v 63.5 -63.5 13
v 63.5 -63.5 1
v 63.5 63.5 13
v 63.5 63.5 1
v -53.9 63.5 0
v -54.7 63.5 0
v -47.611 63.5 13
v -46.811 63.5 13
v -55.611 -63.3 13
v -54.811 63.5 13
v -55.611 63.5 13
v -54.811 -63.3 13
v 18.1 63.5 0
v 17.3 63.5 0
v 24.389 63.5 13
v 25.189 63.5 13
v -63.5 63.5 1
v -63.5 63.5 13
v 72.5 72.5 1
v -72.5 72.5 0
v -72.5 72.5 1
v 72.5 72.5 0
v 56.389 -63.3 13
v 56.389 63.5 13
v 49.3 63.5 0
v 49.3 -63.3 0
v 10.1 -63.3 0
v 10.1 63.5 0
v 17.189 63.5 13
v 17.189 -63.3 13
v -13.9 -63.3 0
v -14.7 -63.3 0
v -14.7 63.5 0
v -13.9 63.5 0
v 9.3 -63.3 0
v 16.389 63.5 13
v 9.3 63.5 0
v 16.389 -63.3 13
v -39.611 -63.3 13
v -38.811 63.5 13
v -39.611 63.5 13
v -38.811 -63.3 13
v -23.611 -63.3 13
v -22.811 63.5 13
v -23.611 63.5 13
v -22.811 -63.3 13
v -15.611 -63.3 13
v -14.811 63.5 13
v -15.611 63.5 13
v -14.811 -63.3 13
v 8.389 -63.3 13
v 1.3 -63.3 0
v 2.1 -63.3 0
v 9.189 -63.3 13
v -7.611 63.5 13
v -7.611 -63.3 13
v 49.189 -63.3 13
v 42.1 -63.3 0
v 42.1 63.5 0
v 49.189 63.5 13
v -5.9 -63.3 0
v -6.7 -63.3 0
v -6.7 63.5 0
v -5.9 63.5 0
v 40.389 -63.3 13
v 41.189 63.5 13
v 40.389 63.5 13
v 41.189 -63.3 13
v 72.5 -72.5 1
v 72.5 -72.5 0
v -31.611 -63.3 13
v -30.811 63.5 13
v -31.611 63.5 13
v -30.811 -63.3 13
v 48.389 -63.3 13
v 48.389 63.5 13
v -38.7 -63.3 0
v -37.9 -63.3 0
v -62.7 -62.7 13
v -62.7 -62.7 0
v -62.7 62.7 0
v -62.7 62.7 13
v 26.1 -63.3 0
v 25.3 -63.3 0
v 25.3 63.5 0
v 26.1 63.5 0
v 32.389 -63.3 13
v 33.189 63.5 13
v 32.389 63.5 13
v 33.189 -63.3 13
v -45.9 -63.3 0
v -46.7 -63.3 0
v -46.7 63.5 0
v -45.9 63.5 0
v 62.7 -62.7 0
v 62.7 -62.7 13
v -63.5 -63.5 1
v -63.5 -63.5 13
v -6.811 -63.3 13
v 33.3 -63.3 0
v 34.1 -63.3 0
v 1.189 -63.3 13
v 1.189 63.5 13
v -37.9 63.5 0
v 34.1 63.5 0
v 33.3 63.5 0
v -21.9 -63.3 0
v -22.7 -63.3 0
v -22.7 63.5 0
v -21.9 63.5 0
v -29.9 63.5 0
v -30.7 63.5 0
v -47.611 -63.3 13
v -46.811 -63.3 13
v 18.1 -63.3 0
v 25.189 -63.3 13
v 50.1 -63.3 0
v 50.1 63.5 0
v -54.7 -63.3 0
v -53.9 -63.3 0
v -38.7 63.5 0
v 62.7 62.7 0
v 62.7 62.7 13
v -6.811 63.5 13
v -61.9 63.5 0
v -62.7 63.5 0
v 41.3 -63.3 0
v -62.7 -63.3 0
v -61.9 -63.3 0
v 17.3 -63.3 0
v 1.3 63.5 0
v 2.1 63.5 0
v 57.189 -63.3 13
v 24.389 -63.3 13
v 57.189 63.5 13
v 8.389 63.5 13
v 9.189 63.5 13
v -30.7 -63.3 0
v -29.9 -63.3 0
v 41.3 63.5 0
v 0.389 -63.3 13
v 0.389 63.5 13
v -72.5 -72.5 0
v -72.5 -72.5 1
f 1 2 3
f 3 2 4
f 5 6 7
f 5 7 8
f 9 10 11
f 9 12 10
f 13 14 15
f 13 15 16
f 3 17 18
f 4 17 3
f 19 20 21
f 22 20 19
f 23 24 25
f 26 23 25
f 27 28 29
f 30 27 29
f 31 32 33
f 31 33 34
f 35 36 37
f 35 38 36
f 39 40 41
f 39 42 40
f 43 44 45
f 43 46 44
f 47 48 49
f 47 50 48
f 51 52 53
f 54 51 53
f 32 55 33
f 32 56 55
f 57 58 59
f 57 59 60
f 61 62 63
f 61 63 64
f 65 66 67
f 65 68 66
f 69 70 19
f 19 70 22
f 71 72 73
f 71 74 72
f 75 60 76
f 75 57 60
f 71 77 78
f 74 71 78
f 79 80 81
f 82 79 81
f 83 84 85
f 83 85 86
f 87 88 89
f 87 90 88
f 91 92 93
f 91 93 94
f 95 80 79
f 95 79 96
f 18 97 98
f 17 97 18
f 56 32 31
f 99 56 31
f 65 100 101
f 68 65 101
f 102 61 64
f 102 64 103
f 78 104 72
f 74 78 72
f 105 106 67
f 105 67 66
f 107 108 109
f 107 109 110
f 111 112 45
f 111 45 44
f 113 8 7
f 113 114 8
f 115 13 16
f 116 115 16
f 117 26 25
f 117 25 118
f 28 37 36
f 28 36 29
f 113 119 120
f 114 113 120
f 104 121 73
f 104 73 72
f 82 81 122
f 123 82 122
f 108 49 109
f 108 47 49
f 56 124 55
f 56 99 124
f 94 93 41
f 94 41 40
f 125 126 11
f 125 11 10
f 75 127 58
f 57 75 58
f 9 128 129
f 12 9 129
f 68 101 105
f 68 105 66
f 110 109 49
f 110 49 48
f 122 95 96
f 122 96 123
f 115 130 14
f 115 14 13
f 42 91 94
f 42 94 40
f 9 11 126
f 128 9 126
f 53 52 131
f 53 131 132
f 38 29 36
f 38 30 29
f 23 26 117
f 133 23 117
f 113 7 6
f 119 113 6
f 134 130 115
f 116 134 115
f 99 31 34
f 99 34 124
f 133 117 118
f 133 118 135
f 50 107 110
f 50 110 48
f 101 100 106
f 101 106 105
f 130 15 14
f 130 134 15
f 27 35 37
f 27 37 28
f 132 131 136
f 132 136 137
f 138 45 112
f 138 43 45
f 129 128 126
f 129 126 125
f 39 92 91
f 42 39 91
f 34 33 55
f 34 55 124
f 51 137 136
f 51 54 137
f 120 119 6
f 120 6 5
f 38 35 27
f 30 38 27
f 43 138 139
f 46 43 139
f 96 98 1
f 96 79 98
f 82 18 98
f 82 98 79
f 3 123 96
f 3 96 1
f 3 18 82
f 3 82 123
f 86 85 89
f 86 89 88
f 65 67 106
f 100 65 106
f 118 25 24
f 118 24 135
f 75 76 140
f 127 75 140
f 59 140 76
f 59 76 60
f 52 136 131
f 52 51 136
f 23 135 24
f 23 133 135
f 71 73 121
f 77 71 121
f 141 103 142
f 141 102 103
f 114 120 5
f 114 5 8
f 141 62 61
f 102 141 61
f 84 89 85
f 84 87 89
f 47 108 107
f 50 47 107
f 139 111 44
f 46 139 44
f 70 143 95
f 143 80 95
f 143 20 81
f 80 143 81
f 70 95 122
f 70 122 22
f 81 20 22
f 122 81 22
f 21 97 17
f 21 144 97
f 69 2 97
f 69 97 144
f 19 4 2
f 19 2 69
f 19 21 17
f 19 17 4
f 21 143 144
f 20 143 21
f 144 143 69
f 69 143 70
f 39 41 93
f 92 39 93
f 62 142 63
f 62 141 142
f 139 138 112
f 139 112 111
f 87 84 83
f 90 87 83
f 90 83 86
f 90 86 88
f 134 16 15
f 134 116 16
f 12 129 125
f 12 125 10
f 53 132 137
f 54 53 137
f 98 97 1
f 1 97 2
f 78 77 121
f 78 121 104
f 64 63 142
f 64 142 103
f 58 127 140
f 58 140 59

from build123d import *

# Parameters (mm, degrees)
F0_W          = 145
F0_H          = 145
F0_W_2        = 127
F0_H_2        = 127
F0_W_3        = 125.4
F0_H_3        = 125.4
F1_DEPTH      = 1
F2_DEPTH      = 13
F4_DEPTH      = 126
F4_DEPTH_BACK = 0.8


# Not quite as in the source:
# - a feature names something its author has since deleted; it is built from what else it names


with BuildPart() as f1:
    # F0 (on Top) → F1 (new body)
    with BuildSketch(Plane.XY):
        Rectangle(F0_W, F0_H)
        Rectangle(F0_W_2, F0_H_2, mode=Mode.SUBTRACT)
        Rectangle(F0_W_2, F0_H_2)
        Rectangle(F0_W_3, F0_H_3, mode=Mode.SUBTRACT)
    extrude(amount=F1_DEPTH)

    # F0 (on Top) → F2 (join)
    with BuildSketch(Plane.XY):
        Rectangle(F0_W_2, F0_H_2)
        Rectangle(F0_W_3, F0_H_3, mode=Mode.SUBTRACT)
    extrude(amount=F2_DEPTH)


with BuildPart() as f4:
    # F3 (on face) → F4 (new body, two sides)
    with BuildSketch(Plane.XZ.offset(-62.7)) as f4_sk:
        Polygon((-55.6109249592, 13), (-62.7, 0), (-61.9, 0), (-54.8109249592, 13), align=None)
    extrude(amount=F4_DEPTH)
    extrude(f4_sk.sketch, amount=-F4_DEPTH_BACK)


with BuildPart() as f4b:
    # F3 (on face) → F4, piece 2 (new body, two sides)
    with BuildSketch(Plane.XZ.offset(-62.7)) as f4_2_sk:
        Polygon((-47.6109249592, 13), (-54.7, 0), (-53.9, 0), (-46.8109249592, 13), align=None)
    extrude(amount=F4_DEPTH)
    extrude(f4_2_sk.sketch, amount=-F4_DEPTH_BACK)


with BuildPart() as f4c:
    # F3 (on face) → F4, piece 3 (new body, two sides)
    with BuildSketch(Plane.XZ.offset(-62.7)) as f4_3_sk:
        Polygon((-39.6109249592, 13), (-46.7, 0), (-45.9, 0), (-38.8109249592, 13), align=None)
    extrude(amount=F4_DEPTH)
    extrude(f4_3_sk.sketch, amount=-F4_DEPTH_BACK)


with BuildPart() as f4d:
    # F3 (on face) → F4, piece 4 (new body, two sides)
    with BuildSketch(Plane.XZ.offset(-62.7)) as f4_4_sk:
        Polygon((-31.6109249592, 13), (-38.7, 0), (-37.9, 0), (-30.8109249592, 13), align=None)
    extrude(amount=F4_DEPTH)
    extrude(f4_4_sk.sketch, amount=-F4_DEPTH_BACK)


with BuildPart() as f4e:
    # F3 (on face) → F4, piece 5 (new body, two sides)
    with BuildSketch(Plane.XZ.offset(-62.7)) as f4_5_sk:
        Polygon((-23.6109249592, 13), (-30.7, 0), (-29.9, 0), (-22.8109249592, 13), align=None)
    extrude(amount=F4_DEPTH)
    extrude(f4_5_sk.sketch, amount=-F4_DEPTH_BACK)


with BuildPart() as f4f:
    # F3 (on face) → F4, piece 6 (new body, two sides)
    with BuildSketch(Plane.XZ.offset(-62.7)) as f4_6_sk:
        Polygon((-15.6109249592, 13), (-22.7, 0), (-21.9, 0), (-14.8109249592, 13), align=None)
    extrude(amount=F4_DEPTH)
    extrude(f4_6_sk.sketch, amount=-F4_DEPTH_BACK)


with BuildPart() as f4g:
    # F3 (on face) → F4, piece 7 (new body, two sides)
    with BuildSketch(Plane.XZ.offset(-62.7)) as f4_7_sk:
        Polygon((-7.6109249592, 13), (-14.7, 0), (-13.9, 0), (-6.8109249592, 13), align=None)
    extrude(amount=F4_DEPTH)
    extrude(f4_7_sk.sketch, amount=-F4_DEPTH_BACK)


with BuildPart() as f4h:
    # F3 (on face) → F4, piece 8 (new body, two sides)
    with BuildSketch(Plane.XZ.offset(-62.7)) as f4_8_sk:
        Polygon((0.3890750408, 13), (-6.7, 0), (-5.9, 0), (1.1890750408, 13), align=None)
    extrude(amount=F4_DEPTH)
    extrude(f4_8_sk.sketch, amount=-F4_DEPTH_BACK)


with BuildPart() as f4i:
    # F3 (on face) → F4, piece 9 (new body, two sides)
    with BuildSketch(Plane.XZ.offset(-62.7)) as f4_9_sk:
        Polygon((8.3890750408, 13), (1.3, 0), (2.1, 0), (9.1890750408, 13), align=None)
    extrude(amount=F4_DEPTH)
    extrude(f4_9_sk.sketch, amount=-F4_DEPTH_BACK)


with BuildPart() as f4j:
    # F3 (on face) → F4, piece 10 (new body, two sides)
    with BuildSketch(Plane.XZ.offset(-62.7)) as f4_10_sk:
        Polygon((16.3890750408, 13), (9.3, 0), (10.1, 0), (17.1890750408, 13), align=None)
    extrude(amount=F4_DEPTH)
    extrude(f4_10_sk.sketch, amount=-F4_DEPTH_BACK)


with BuildPart() as f4k:
    # F3 (on face) → F4, piece 11 (new body, two sides)
    with BuildSketch(Plane.XZ.offset(-62.7)) as f4_11_sk:
        Polygon((24.3890750408, 13), (17.3, 0), (18.1, 0), (25.1890750408, 13), align=None)
    extrude(amount=F4_DEPTH)
    extrude(f4_11_sk.sketch, amount=-F4_DEPTH_BACK)


with BuildPart() as f4l:
    # F3 (on face) → F4, piece 12 (new body, two sides)
    with BuildSketch(Plane.XZ.offset(-62.7)) as f4_12_sk:
        Polygon((32.3890750408, 13), (25.3, 0), (26.1, 0), (33.1890750408, 13), align=None)
    extrude(amount=F4_DEPTH)
    extrude(f4_12_sk.sketch, amount=-F4_DEPTH_BACK)


with BuildPart() as f4m:
    # F3 (on face) → F4, piece 13 (new body, two sides)
    with BuildSketch(Plane.XZ.offset(-62.7)) as f4_13_sk:
        Polygon((40.3890750408, 13), (33.3, 0), (34.1, 0), (41.1890750408, 13), align=None)
    extrude(amount=F4_DEPTH)
    extrude(f4_13_sk.sketch, amount=-F4_DEPTH_BACK)


with BuildPart() as f4n:
    # F3 (on face) → F4, piece 14 (new body, two sides)
    with BuildSketch(Plane.XZ.offset(-62.7)) as f4_14_sk:
        Polygon((48.3890750408, 13), (41.3, 0), (42.1, 0), (49.1890750408, 13), align=None)
    extrude(amount=F4_DEPTH)
    extrude(f4_14_sk.sketch, amount=-F4_DEPTH_BACK)


with BuildPart() as f4o:
    # F3 (on face) → F4, piece 15 (new body, two sides)
    with BuildSketch(Plane.XZ.offset(-62.7)) as f4_15_sk:
        Polygon((56.3890750408, 13), (49.3, 0), (50.1, 0), (57.1890750408, 13), align=None)
    extrude(amount=F4_DEPTH)
    extrude(f4_15_sk.sketch, amount=-F4_DEPTH_BACK)


solid = Compound([f1.part, f4.part, f4b.part, f4c.part, f4d.part, f4e.part, f4f.part, f4g.part, f4h.part, f4i.part, f4j.part, f4k.part, f4l.part, f4m.part, f4n.part, f4o.part])
